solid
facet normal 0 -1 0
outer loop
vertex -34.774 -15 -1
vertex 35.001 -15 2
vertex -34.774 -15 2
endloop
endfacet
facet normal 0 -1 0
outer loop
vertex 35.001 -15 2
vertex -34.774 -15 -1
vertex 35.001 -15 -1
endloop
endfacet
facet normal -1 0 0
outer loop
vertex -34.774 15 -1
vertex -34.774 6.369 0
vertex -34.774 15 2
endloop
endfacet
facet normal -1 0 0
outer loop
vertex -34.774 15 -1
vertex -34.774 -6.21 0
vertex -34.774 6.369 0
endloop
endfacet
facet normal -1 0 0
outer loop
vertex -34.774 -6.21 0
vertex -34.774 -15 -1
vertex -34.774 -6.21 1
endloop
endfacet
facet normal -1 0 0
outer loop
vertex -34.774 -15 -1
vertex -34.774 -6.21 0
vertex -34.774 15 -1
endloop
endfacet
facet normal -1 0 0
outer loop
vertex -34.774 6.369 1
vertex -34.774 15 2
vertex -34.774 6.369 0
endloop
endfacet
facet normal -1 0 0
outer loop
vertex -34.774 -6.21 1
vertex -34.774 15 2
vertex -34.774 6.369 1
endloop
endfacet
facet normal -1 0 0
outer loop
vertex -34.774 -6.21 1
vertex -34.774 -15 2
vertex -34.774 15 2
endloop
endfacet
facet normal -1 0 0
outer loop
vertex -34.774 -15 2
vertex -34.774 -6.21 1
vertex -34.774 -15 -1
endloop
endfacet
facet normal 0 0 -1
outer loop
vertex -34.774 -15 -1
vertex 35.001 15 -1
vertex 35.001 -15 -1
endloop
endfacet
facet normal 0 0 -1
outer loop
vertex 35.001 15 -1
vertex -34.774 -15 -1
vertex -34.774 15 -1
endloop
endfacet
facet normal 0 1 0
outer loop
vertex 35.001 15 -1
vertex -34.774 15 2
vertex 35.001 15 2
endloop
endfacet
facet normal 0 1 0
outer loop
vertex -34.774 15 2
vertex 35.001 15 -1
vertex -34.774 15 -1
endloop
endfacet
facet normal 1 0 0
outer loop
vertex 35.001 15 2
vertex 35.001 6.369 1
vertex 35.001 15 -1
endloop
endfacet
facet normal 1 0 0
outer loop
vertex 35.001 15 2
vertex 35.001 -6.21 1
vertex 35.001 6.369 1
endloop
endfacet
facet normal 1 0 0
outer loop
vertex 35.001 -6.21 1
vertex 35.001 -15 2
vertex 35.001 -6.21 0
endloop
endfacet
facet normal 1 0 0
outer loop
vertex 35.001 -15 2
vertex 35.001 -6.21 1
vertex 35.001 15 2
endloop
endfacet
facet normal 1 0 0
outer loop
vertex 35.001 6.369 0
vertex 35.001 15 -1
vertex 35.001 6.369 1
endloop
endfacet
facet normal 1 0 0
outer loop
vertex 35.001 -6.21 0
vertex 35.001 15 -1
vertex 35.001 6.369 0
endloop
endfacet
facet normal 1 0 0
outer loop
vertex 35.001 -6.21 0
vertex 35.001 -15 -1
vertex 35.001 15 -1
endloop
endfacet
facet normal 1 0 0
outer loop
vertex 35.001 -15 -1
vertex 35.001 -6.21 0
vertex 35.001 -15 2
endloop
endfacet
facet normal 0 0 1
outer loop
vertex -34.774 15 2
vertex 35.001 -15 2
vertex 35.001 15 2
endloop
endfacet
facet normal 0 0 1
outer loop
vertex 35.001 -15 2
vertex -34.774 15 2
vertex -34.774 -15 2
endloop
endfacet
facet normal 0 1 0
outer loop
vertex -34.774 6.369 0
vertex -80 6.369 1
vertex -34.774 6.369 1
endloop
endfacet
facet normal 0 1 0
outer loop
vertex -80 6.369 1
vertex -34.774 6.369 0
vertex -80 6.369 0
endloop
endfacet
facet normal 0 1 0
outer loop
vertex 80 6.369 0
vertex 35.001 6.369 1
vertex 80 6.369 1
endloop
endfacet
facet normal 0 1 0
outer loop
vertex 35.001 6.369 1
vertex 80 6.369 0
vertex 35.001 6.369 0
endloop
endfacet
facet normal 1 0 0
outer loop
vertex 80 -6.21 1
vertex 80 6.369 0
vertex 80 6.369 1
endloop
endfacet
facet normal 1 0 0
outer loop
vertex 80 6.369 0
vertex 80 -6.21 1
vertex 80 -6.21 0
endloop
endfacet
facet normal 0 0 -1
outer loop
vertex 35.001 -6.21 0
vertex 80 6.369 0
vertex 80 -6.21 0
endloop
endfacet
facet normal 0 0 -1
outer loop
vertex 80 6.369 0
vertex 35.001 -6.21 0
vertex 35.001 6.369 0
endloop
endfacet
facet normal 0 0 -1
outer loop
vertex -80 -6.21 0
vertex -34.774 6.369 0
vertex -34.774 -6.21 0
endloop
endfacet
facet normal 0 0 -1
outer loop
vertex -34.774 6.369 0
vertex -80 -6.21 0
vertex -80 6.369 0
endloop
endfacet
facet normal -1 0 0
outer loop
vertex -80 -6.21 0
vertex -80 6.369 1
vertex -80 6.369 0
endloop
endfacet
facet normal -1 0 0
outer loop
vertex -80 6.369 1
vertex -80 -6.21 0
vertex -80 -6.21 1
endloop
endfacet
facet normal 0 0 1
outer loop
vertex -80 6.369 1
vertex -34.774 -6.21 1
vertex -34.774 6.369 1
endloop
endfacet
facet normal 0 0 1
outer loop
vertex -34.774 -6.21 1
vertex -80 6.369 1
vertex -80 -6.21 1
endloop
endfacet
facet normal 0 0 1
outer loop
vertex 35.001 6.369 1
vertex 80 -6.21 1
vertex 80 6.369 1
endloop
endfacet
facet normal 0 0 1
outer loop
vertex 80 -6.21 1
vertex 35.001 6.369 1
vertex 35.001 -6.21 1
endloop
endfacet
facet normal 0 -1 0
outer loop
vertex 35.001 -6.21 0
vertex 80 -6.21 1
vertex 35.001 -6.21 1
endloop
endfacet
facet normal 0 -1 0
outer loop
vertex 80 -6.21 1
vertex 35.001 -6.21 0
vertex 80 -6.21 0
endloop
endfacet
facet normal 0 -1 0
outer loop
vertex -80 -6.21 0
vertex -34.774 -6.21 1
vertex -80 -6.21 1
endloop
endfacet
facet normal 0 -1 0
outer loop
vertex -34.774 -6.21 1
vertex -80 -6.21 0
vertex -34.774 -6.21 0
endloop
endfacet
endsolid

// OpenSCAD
module stamp(
    txt = "OpenSCAD",        // Stamp text
    font_size = 10,     // approx. height of Letter
    font = "Liberation Sans:stype=Bold Italic",
//    font = "MS Gothic:stype=Regular",
    stamp_depth =2,     // depth of the stamp relief
) {

    module relief() {
        linear_extrude( height = stamp_depth )
        text(
            text = txt,
            size = font_size,
            font = font,
            valign = "center",
            halign = "center",
            $fn = 50
            );
        }
        
    module stamp_body() {
    }
    
    color("Peru")
        relief();
        
    stamp_body();
    
    module text_area() {
    
        estimated_length = len(txt) * font_size * 2;
        
        translate( [0,0,-1] )
        rotate([-90,0,0])
        translate([0,0,-(3 * font_size) / 2])
        linear_extrude( height = 3 * font_size)
        hull()
        projection()
        rotate([90,0,0])
        linear_extrude( height = 3 )
        text(
                text = txt,
                size = font_size,
                font = font,
                valign = "center",
                halign = "center",
                $fn = 50
                );
        
        rotate( [0, -90, 0] )
        translate( [ 0, 0, -estimated_length / 2] )
        linear_extrude( height = estimated_length)
        hull()
        projection()
        rotate([0,90,0])
        linear_extrude( height = 1 )        
        text(
                text = txt,
                size = font_size,
                font = font,
                valign = "center",
                halign = "center",
                $fn = 50
                );
        }
        
        
    
   ! text_area(); // debug

}

stamp("OpenSCAD", 10);
